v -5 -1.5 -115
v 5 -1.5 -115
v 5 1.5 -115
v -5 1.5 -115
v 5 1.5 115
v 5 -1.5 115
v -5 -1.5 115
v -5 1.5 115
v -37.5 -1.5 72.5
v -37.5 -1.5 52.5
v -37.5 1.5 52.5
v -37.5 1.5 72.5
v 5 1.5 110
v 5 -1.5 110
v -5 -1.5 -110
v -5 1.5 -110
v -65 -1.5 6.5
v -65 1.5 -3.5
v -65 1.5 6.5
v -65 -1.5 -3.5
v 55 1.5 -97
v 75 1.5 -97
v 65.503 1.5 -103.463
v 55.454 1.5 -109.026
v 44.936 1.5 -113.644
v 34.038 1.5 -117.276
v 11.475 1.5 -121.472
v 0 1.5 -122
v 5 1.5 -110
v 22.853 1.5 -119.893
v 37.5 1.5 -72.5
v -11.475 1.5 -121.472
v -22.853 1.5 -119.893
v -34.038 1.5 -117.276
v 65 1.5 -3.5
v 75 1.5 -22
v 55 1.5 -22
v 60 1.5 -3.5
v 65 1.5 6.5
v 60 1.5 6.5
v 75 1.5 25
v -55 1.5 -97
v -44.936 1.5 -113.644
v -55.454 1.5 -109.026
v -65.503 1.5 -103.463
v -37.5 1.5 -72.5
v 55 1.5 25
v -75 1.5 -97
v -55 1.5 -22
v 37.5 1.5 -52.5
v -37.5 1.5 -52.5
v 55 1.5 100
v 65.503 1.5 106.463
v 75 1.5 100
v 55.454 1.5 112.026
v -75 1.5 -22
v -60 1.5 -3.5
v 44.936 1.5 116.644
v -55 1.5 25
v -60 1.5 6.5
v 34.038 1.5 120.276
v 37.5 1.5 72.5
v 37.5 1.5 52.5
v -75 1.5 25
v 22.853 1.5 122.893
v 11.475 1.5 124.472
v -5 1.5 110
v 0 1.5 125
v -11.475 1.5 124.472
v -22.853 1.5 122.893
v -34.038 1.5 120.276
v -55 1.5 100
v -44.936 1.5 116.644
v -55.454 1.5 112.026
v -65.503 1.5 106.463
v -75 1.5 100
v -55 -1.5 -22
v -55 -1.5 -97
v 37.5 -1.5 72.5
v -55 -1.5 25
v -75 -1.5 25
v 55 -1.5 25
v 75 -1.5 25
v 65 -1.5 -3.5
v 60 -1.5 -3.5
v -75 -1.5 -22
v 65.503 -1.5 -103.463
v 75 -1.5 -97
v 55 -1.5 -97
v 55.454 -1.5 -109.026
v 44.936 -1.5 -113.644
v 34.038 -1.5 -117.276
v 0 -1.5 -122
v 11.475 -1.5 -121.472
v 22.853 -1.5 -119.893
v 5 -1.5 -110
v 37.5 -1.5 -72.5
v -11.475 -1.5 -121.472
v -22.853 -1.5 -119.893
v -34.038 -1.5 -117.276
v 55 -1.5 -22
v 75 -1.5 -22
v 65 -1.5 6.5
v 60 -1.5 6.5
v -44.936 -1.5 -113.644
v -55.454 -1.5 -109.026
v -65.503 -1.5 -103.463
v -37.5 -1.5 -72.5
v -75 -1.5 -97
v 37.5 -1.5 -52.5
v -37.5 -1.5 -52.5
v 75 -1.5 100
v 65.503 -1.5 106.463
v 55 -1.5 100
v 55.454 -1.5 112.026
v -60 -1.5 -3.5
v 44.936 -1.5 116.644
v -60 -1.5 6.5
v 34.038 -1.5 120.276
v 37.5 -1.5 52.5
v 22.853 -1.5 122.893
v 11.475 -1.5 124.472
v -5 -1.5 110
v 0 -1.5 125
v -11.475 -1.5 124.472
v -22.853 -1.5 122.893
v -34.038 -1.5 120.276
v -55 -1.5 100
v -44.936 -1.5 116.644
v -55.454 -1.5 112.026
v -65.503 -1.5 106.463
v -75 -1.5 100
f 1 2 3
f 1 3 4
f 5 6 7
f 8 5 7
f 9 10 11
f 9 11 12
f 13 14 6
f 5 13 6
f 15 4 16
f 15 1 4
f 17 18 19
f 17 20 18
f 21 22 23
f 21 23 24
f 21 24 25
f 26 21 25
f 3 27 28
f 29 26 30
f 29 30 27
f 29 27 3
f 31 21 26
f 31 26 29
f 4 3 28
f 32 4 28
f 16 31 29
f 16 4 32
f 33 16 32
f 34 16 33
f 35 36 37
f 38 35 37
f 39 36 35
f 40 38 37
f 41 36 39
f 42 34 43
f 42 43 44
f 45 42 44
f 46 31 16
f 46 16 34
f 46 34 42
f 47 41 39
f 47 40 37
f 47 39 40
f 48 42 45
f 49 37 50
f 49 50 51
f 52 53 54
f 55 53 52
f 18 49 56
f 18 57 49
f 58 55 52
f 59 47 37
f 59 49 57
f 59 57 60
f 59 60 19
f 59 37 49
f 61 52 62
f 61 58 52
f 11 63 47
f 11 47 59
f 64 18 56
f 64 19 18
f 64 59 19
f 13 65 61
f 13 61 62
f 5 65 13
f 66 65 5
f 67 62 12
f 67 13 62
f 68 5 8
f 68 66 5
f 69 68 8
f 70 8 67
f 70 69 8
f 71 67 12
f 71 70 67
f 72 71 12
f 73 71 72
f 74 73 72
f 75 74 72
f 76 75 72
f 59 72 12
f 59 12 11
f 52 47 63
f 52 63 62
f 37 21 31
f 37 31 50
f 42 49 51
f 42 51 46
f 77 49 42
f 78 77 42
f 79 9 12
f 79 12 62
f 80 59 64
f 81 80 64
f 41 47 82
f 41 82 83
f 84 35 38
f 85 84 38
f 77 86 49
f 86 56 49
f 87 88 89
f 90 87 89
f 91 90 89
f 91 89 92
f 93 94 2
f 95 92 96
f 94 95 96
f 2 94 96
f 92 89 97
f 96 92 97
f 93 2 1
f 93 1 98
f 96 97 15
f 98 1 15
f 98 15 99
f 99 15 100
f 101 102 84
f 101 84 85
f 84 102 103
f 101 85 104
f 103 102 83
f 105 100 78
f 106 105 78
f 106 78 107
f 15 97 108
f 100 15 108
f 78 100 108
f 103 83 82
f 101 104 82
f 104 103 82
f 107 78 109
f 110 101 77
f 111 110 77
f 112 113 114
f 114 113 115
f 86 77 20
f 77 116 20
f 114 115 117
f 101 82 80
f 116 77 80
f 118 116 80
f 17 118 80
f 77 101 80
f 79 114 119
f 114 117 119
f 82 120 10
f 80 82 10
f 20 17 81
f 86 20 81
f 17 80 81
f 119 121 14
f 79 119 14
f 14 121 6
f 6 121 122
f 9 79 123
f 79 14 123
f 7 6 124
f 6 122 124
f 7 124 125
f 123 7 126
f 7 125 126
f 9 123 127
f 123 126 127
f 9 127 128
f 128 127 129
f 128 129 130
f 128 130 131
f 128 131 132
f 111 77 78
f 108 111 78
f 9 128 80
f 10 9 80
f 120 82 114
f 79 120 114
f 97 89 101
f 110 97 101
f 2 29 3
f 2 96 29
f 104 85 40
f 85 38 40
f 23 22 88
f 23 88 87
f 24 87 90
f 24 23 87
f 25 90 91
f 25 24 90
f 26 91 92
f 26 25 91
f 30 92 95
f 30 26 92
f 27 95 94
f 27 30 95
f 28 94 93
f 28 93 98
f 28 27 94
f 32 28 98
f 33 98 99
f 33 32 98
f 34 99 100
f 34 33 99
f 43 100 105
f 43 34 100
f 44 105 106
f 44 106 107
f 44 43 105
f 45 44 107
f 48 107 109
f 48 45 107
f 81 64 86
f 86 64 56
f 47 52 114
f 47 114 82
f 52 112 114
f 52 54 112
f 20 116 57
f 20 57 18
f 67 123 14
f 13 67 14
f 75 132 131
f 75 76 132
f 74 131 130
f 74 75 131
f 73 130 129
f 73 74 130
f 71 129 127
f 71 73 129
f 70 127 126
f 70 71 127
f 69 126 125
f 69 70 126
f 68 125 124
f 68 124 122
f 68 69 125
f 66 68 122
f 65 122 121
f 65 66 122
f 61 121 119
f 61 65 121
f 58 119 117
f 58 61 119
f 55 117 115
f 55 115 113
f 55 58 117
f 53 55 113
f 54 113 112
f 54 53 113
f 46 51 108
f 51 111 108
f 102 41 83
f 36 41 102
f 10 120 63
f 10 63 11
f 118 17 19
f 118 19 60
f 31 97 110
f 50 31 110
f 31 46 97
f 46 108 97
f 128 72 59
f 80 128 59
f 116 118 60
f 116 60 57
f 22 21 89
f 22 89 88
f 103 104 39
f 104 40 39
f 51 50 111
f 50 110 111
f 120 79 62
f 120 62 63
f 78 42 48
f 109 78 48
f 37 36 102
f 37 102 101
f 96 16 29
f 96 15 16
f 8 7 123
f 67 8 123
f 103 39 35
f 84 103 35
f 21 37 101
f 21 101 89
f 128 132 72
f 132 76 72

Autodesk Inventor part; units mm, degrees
ref_plane "YZ Plane" through (0, 0, 0) normal (1, 0, 0) x (0, 1, 0)
ref_plane "XZ Plane" through (0, 0, 0) normal (0, 1, 0) x (-1, 0, 0)
ref_plane "XY Plane" through (0, 0, 0) normal (0, 0, 1) x (1, 0, 0)
sketch "Sketch1" plane through (0, 0, 0) normal (0, 1, 0) x (-1, 0, 0)
  line L0 (-75, 100) -> (-55, 100)
  line L1 (-55, 100) -> (-55, 25)
  line L2 (-55, 25) -> (-75, 25)
  line L3 (-75, 25) -> (-75, -22)
  line L4 (-75, -22) -> (-55, -22)
  line L5 (-55, -22) -> (-55, -97)
  line L6 (-55, -97) -> (-75, -97)
  line L7 (0, 0) -> (0, -13.688)
  line L8 (0, 0) -> (16.407, 0)
  line L9 (75, 100) -> (55, 100)
  line L10 (55, 100) -> (55, 25)
  line L11 (55, 25) -> (75, 25)
  line L12 (75, 25) -> (75, -22)
  line L13 (75, -22) -> (55, -22)
  line L14 (55, -22) -> (55, -97)
  line L15 (55, -97) -> (75, -97)
  arc A0 (75, 100) -> (-75, 100) centre (0, 0) ccw
  arc A1 (-75, -97) -> (75, -97) centre (0, 3) ccw
  line L16 (-60, -3.5) -> (-65, -3.5)
  line L17 (-65, -3.5) -> (-65, 6.5)
  line L18 (-65, 6.5) -> (-60, 6.5)
  line L19 (-60, 6.5) -> (-60, -3.5)
  line L20 (60, -3.5) -> (65, -3.5)
  line L21 (65, -3.5) -> (65, 6.5)
  line L22 (65, 6.5) -> (60, 6.5)
  line L23 (60, 6.5) -> (60, -3.5)
extrude "Extrusion1" add sketch "Sketch1" along normal mid plane 3 contours A0 L9 L10 L11 L12 L13 L14 L15 A1 L6 L5 L4 L3 L2 L1 L0 | L16 L17 L18 L19 | L23 L22 L21 L20
sketch "Sketch2" plane through (0, 1.5, 0) normal (0, 1, 0) x (1, 0, 0)
  point P0 (0, 0)
sketch "Sketch3" plane through (0, 1.5, 0) normal (0, 1, 0) x (1, 0, 0)
  line L0 (65, 3.5) -> (60, 3.5)
  line L1 (60, 3.5) -> (60, -6.5)
  line L2 (60, -6.5) -> (65, -6.5)
  line L3 (65, -6.5) -> (65, 3.5)
  line L4 (0, 0) -> (0, -6.5)
  line L5 (-65, 3.5) -> (-60, 3.5)
  line L6 (-60, 3.5) -> (-60, -6.5)
  line L7 (-60, -6.5) -> (-65, -6.5)
  line L8 (-65, -6.5) -> (-65, 3.5)
extrude "Extrusion2" cut sketch "Sketch3" against normal blind 3 contours L3 L2 L1 L0
sketch "Sketch4" plane through (0, -1.5, 0) normal (0, -1, 0) x (1, 0, 0)
  line L0 (-60, -3.5) -> (-65, -3.5)
  line L1 (-65, -3.5) -> (-65, 6.5)
  line L2 (-65, 6.5) -> (-60, 6.5)
  line L3 (-60, 6.5) -> (-60, -3.5)
  point P0 (0, 0)
extrude "Extrusion3" cut sketch "Sketch4" against normal blind 3
sketch "Sketch5" plane through (0, -1.5, 0) normal (0, -1, 0) x (1, 0, 0)
  line L0 (-5, 110) -> (5, 110)
  line L1 (5, 110) -> (5, 115)
  line L2 (5, 115) -> (-5, 115)
  line L3 (-5, 115) -> (-5, 110)
  line L4 (0, 0) -> (8.5415, 0)
  line L5 (-5, -110) -> (5, -110)
  line L6 (5, -110) -> (5, -115)
  line L7 (5, -115) -> (-5, -115)
  line L8 (-5, -115) -> (-5, -110)
extrude "Extrusion4" cut sketch "Sketch5" against normal blind 3
sketch "Sketch6" plane through (0, -1.5, 0) normal (0, -1, 0) x (1, 0, 0)
  line L0 (-37.5, 72.5) -> (37.5, 72.5)
  line L1 (37.5, 72.5) -> (37.5, 52.5)
  line L2 (37.5, 52.5) -> (-37.5, 52.5)
  line L3 (-37.5, 52.5) -> (-37.5, 72.5)
  line L4 (0, 0) -> (15.5313, 0)
  line L5 (-37.5, -72.5) -> (37.5, -72.5)
  line L6 (37.5, -72.5) -> (37.5, -52.5)
  line L7 (37.5, -52.5) -> (-37.5, -52.5)
  line L8 (-37.5, -52.5) -> (-37.5, -72.5)
extrude "Extrusion5" cut sketch "Sketch6" against normal blind 3
sketch "Sketch7" plane through (0, -1.5, 0) normal (0, -1, 0) x (1, 0, 0)
  point P0 (0, 0)
sketch "Sketch8" plane through (0, -1.5, 0) normal (0, -1, 0) x (1, 0, 0)
  point P0 (0, 0)
properties part number "PakAnomRevisi"
